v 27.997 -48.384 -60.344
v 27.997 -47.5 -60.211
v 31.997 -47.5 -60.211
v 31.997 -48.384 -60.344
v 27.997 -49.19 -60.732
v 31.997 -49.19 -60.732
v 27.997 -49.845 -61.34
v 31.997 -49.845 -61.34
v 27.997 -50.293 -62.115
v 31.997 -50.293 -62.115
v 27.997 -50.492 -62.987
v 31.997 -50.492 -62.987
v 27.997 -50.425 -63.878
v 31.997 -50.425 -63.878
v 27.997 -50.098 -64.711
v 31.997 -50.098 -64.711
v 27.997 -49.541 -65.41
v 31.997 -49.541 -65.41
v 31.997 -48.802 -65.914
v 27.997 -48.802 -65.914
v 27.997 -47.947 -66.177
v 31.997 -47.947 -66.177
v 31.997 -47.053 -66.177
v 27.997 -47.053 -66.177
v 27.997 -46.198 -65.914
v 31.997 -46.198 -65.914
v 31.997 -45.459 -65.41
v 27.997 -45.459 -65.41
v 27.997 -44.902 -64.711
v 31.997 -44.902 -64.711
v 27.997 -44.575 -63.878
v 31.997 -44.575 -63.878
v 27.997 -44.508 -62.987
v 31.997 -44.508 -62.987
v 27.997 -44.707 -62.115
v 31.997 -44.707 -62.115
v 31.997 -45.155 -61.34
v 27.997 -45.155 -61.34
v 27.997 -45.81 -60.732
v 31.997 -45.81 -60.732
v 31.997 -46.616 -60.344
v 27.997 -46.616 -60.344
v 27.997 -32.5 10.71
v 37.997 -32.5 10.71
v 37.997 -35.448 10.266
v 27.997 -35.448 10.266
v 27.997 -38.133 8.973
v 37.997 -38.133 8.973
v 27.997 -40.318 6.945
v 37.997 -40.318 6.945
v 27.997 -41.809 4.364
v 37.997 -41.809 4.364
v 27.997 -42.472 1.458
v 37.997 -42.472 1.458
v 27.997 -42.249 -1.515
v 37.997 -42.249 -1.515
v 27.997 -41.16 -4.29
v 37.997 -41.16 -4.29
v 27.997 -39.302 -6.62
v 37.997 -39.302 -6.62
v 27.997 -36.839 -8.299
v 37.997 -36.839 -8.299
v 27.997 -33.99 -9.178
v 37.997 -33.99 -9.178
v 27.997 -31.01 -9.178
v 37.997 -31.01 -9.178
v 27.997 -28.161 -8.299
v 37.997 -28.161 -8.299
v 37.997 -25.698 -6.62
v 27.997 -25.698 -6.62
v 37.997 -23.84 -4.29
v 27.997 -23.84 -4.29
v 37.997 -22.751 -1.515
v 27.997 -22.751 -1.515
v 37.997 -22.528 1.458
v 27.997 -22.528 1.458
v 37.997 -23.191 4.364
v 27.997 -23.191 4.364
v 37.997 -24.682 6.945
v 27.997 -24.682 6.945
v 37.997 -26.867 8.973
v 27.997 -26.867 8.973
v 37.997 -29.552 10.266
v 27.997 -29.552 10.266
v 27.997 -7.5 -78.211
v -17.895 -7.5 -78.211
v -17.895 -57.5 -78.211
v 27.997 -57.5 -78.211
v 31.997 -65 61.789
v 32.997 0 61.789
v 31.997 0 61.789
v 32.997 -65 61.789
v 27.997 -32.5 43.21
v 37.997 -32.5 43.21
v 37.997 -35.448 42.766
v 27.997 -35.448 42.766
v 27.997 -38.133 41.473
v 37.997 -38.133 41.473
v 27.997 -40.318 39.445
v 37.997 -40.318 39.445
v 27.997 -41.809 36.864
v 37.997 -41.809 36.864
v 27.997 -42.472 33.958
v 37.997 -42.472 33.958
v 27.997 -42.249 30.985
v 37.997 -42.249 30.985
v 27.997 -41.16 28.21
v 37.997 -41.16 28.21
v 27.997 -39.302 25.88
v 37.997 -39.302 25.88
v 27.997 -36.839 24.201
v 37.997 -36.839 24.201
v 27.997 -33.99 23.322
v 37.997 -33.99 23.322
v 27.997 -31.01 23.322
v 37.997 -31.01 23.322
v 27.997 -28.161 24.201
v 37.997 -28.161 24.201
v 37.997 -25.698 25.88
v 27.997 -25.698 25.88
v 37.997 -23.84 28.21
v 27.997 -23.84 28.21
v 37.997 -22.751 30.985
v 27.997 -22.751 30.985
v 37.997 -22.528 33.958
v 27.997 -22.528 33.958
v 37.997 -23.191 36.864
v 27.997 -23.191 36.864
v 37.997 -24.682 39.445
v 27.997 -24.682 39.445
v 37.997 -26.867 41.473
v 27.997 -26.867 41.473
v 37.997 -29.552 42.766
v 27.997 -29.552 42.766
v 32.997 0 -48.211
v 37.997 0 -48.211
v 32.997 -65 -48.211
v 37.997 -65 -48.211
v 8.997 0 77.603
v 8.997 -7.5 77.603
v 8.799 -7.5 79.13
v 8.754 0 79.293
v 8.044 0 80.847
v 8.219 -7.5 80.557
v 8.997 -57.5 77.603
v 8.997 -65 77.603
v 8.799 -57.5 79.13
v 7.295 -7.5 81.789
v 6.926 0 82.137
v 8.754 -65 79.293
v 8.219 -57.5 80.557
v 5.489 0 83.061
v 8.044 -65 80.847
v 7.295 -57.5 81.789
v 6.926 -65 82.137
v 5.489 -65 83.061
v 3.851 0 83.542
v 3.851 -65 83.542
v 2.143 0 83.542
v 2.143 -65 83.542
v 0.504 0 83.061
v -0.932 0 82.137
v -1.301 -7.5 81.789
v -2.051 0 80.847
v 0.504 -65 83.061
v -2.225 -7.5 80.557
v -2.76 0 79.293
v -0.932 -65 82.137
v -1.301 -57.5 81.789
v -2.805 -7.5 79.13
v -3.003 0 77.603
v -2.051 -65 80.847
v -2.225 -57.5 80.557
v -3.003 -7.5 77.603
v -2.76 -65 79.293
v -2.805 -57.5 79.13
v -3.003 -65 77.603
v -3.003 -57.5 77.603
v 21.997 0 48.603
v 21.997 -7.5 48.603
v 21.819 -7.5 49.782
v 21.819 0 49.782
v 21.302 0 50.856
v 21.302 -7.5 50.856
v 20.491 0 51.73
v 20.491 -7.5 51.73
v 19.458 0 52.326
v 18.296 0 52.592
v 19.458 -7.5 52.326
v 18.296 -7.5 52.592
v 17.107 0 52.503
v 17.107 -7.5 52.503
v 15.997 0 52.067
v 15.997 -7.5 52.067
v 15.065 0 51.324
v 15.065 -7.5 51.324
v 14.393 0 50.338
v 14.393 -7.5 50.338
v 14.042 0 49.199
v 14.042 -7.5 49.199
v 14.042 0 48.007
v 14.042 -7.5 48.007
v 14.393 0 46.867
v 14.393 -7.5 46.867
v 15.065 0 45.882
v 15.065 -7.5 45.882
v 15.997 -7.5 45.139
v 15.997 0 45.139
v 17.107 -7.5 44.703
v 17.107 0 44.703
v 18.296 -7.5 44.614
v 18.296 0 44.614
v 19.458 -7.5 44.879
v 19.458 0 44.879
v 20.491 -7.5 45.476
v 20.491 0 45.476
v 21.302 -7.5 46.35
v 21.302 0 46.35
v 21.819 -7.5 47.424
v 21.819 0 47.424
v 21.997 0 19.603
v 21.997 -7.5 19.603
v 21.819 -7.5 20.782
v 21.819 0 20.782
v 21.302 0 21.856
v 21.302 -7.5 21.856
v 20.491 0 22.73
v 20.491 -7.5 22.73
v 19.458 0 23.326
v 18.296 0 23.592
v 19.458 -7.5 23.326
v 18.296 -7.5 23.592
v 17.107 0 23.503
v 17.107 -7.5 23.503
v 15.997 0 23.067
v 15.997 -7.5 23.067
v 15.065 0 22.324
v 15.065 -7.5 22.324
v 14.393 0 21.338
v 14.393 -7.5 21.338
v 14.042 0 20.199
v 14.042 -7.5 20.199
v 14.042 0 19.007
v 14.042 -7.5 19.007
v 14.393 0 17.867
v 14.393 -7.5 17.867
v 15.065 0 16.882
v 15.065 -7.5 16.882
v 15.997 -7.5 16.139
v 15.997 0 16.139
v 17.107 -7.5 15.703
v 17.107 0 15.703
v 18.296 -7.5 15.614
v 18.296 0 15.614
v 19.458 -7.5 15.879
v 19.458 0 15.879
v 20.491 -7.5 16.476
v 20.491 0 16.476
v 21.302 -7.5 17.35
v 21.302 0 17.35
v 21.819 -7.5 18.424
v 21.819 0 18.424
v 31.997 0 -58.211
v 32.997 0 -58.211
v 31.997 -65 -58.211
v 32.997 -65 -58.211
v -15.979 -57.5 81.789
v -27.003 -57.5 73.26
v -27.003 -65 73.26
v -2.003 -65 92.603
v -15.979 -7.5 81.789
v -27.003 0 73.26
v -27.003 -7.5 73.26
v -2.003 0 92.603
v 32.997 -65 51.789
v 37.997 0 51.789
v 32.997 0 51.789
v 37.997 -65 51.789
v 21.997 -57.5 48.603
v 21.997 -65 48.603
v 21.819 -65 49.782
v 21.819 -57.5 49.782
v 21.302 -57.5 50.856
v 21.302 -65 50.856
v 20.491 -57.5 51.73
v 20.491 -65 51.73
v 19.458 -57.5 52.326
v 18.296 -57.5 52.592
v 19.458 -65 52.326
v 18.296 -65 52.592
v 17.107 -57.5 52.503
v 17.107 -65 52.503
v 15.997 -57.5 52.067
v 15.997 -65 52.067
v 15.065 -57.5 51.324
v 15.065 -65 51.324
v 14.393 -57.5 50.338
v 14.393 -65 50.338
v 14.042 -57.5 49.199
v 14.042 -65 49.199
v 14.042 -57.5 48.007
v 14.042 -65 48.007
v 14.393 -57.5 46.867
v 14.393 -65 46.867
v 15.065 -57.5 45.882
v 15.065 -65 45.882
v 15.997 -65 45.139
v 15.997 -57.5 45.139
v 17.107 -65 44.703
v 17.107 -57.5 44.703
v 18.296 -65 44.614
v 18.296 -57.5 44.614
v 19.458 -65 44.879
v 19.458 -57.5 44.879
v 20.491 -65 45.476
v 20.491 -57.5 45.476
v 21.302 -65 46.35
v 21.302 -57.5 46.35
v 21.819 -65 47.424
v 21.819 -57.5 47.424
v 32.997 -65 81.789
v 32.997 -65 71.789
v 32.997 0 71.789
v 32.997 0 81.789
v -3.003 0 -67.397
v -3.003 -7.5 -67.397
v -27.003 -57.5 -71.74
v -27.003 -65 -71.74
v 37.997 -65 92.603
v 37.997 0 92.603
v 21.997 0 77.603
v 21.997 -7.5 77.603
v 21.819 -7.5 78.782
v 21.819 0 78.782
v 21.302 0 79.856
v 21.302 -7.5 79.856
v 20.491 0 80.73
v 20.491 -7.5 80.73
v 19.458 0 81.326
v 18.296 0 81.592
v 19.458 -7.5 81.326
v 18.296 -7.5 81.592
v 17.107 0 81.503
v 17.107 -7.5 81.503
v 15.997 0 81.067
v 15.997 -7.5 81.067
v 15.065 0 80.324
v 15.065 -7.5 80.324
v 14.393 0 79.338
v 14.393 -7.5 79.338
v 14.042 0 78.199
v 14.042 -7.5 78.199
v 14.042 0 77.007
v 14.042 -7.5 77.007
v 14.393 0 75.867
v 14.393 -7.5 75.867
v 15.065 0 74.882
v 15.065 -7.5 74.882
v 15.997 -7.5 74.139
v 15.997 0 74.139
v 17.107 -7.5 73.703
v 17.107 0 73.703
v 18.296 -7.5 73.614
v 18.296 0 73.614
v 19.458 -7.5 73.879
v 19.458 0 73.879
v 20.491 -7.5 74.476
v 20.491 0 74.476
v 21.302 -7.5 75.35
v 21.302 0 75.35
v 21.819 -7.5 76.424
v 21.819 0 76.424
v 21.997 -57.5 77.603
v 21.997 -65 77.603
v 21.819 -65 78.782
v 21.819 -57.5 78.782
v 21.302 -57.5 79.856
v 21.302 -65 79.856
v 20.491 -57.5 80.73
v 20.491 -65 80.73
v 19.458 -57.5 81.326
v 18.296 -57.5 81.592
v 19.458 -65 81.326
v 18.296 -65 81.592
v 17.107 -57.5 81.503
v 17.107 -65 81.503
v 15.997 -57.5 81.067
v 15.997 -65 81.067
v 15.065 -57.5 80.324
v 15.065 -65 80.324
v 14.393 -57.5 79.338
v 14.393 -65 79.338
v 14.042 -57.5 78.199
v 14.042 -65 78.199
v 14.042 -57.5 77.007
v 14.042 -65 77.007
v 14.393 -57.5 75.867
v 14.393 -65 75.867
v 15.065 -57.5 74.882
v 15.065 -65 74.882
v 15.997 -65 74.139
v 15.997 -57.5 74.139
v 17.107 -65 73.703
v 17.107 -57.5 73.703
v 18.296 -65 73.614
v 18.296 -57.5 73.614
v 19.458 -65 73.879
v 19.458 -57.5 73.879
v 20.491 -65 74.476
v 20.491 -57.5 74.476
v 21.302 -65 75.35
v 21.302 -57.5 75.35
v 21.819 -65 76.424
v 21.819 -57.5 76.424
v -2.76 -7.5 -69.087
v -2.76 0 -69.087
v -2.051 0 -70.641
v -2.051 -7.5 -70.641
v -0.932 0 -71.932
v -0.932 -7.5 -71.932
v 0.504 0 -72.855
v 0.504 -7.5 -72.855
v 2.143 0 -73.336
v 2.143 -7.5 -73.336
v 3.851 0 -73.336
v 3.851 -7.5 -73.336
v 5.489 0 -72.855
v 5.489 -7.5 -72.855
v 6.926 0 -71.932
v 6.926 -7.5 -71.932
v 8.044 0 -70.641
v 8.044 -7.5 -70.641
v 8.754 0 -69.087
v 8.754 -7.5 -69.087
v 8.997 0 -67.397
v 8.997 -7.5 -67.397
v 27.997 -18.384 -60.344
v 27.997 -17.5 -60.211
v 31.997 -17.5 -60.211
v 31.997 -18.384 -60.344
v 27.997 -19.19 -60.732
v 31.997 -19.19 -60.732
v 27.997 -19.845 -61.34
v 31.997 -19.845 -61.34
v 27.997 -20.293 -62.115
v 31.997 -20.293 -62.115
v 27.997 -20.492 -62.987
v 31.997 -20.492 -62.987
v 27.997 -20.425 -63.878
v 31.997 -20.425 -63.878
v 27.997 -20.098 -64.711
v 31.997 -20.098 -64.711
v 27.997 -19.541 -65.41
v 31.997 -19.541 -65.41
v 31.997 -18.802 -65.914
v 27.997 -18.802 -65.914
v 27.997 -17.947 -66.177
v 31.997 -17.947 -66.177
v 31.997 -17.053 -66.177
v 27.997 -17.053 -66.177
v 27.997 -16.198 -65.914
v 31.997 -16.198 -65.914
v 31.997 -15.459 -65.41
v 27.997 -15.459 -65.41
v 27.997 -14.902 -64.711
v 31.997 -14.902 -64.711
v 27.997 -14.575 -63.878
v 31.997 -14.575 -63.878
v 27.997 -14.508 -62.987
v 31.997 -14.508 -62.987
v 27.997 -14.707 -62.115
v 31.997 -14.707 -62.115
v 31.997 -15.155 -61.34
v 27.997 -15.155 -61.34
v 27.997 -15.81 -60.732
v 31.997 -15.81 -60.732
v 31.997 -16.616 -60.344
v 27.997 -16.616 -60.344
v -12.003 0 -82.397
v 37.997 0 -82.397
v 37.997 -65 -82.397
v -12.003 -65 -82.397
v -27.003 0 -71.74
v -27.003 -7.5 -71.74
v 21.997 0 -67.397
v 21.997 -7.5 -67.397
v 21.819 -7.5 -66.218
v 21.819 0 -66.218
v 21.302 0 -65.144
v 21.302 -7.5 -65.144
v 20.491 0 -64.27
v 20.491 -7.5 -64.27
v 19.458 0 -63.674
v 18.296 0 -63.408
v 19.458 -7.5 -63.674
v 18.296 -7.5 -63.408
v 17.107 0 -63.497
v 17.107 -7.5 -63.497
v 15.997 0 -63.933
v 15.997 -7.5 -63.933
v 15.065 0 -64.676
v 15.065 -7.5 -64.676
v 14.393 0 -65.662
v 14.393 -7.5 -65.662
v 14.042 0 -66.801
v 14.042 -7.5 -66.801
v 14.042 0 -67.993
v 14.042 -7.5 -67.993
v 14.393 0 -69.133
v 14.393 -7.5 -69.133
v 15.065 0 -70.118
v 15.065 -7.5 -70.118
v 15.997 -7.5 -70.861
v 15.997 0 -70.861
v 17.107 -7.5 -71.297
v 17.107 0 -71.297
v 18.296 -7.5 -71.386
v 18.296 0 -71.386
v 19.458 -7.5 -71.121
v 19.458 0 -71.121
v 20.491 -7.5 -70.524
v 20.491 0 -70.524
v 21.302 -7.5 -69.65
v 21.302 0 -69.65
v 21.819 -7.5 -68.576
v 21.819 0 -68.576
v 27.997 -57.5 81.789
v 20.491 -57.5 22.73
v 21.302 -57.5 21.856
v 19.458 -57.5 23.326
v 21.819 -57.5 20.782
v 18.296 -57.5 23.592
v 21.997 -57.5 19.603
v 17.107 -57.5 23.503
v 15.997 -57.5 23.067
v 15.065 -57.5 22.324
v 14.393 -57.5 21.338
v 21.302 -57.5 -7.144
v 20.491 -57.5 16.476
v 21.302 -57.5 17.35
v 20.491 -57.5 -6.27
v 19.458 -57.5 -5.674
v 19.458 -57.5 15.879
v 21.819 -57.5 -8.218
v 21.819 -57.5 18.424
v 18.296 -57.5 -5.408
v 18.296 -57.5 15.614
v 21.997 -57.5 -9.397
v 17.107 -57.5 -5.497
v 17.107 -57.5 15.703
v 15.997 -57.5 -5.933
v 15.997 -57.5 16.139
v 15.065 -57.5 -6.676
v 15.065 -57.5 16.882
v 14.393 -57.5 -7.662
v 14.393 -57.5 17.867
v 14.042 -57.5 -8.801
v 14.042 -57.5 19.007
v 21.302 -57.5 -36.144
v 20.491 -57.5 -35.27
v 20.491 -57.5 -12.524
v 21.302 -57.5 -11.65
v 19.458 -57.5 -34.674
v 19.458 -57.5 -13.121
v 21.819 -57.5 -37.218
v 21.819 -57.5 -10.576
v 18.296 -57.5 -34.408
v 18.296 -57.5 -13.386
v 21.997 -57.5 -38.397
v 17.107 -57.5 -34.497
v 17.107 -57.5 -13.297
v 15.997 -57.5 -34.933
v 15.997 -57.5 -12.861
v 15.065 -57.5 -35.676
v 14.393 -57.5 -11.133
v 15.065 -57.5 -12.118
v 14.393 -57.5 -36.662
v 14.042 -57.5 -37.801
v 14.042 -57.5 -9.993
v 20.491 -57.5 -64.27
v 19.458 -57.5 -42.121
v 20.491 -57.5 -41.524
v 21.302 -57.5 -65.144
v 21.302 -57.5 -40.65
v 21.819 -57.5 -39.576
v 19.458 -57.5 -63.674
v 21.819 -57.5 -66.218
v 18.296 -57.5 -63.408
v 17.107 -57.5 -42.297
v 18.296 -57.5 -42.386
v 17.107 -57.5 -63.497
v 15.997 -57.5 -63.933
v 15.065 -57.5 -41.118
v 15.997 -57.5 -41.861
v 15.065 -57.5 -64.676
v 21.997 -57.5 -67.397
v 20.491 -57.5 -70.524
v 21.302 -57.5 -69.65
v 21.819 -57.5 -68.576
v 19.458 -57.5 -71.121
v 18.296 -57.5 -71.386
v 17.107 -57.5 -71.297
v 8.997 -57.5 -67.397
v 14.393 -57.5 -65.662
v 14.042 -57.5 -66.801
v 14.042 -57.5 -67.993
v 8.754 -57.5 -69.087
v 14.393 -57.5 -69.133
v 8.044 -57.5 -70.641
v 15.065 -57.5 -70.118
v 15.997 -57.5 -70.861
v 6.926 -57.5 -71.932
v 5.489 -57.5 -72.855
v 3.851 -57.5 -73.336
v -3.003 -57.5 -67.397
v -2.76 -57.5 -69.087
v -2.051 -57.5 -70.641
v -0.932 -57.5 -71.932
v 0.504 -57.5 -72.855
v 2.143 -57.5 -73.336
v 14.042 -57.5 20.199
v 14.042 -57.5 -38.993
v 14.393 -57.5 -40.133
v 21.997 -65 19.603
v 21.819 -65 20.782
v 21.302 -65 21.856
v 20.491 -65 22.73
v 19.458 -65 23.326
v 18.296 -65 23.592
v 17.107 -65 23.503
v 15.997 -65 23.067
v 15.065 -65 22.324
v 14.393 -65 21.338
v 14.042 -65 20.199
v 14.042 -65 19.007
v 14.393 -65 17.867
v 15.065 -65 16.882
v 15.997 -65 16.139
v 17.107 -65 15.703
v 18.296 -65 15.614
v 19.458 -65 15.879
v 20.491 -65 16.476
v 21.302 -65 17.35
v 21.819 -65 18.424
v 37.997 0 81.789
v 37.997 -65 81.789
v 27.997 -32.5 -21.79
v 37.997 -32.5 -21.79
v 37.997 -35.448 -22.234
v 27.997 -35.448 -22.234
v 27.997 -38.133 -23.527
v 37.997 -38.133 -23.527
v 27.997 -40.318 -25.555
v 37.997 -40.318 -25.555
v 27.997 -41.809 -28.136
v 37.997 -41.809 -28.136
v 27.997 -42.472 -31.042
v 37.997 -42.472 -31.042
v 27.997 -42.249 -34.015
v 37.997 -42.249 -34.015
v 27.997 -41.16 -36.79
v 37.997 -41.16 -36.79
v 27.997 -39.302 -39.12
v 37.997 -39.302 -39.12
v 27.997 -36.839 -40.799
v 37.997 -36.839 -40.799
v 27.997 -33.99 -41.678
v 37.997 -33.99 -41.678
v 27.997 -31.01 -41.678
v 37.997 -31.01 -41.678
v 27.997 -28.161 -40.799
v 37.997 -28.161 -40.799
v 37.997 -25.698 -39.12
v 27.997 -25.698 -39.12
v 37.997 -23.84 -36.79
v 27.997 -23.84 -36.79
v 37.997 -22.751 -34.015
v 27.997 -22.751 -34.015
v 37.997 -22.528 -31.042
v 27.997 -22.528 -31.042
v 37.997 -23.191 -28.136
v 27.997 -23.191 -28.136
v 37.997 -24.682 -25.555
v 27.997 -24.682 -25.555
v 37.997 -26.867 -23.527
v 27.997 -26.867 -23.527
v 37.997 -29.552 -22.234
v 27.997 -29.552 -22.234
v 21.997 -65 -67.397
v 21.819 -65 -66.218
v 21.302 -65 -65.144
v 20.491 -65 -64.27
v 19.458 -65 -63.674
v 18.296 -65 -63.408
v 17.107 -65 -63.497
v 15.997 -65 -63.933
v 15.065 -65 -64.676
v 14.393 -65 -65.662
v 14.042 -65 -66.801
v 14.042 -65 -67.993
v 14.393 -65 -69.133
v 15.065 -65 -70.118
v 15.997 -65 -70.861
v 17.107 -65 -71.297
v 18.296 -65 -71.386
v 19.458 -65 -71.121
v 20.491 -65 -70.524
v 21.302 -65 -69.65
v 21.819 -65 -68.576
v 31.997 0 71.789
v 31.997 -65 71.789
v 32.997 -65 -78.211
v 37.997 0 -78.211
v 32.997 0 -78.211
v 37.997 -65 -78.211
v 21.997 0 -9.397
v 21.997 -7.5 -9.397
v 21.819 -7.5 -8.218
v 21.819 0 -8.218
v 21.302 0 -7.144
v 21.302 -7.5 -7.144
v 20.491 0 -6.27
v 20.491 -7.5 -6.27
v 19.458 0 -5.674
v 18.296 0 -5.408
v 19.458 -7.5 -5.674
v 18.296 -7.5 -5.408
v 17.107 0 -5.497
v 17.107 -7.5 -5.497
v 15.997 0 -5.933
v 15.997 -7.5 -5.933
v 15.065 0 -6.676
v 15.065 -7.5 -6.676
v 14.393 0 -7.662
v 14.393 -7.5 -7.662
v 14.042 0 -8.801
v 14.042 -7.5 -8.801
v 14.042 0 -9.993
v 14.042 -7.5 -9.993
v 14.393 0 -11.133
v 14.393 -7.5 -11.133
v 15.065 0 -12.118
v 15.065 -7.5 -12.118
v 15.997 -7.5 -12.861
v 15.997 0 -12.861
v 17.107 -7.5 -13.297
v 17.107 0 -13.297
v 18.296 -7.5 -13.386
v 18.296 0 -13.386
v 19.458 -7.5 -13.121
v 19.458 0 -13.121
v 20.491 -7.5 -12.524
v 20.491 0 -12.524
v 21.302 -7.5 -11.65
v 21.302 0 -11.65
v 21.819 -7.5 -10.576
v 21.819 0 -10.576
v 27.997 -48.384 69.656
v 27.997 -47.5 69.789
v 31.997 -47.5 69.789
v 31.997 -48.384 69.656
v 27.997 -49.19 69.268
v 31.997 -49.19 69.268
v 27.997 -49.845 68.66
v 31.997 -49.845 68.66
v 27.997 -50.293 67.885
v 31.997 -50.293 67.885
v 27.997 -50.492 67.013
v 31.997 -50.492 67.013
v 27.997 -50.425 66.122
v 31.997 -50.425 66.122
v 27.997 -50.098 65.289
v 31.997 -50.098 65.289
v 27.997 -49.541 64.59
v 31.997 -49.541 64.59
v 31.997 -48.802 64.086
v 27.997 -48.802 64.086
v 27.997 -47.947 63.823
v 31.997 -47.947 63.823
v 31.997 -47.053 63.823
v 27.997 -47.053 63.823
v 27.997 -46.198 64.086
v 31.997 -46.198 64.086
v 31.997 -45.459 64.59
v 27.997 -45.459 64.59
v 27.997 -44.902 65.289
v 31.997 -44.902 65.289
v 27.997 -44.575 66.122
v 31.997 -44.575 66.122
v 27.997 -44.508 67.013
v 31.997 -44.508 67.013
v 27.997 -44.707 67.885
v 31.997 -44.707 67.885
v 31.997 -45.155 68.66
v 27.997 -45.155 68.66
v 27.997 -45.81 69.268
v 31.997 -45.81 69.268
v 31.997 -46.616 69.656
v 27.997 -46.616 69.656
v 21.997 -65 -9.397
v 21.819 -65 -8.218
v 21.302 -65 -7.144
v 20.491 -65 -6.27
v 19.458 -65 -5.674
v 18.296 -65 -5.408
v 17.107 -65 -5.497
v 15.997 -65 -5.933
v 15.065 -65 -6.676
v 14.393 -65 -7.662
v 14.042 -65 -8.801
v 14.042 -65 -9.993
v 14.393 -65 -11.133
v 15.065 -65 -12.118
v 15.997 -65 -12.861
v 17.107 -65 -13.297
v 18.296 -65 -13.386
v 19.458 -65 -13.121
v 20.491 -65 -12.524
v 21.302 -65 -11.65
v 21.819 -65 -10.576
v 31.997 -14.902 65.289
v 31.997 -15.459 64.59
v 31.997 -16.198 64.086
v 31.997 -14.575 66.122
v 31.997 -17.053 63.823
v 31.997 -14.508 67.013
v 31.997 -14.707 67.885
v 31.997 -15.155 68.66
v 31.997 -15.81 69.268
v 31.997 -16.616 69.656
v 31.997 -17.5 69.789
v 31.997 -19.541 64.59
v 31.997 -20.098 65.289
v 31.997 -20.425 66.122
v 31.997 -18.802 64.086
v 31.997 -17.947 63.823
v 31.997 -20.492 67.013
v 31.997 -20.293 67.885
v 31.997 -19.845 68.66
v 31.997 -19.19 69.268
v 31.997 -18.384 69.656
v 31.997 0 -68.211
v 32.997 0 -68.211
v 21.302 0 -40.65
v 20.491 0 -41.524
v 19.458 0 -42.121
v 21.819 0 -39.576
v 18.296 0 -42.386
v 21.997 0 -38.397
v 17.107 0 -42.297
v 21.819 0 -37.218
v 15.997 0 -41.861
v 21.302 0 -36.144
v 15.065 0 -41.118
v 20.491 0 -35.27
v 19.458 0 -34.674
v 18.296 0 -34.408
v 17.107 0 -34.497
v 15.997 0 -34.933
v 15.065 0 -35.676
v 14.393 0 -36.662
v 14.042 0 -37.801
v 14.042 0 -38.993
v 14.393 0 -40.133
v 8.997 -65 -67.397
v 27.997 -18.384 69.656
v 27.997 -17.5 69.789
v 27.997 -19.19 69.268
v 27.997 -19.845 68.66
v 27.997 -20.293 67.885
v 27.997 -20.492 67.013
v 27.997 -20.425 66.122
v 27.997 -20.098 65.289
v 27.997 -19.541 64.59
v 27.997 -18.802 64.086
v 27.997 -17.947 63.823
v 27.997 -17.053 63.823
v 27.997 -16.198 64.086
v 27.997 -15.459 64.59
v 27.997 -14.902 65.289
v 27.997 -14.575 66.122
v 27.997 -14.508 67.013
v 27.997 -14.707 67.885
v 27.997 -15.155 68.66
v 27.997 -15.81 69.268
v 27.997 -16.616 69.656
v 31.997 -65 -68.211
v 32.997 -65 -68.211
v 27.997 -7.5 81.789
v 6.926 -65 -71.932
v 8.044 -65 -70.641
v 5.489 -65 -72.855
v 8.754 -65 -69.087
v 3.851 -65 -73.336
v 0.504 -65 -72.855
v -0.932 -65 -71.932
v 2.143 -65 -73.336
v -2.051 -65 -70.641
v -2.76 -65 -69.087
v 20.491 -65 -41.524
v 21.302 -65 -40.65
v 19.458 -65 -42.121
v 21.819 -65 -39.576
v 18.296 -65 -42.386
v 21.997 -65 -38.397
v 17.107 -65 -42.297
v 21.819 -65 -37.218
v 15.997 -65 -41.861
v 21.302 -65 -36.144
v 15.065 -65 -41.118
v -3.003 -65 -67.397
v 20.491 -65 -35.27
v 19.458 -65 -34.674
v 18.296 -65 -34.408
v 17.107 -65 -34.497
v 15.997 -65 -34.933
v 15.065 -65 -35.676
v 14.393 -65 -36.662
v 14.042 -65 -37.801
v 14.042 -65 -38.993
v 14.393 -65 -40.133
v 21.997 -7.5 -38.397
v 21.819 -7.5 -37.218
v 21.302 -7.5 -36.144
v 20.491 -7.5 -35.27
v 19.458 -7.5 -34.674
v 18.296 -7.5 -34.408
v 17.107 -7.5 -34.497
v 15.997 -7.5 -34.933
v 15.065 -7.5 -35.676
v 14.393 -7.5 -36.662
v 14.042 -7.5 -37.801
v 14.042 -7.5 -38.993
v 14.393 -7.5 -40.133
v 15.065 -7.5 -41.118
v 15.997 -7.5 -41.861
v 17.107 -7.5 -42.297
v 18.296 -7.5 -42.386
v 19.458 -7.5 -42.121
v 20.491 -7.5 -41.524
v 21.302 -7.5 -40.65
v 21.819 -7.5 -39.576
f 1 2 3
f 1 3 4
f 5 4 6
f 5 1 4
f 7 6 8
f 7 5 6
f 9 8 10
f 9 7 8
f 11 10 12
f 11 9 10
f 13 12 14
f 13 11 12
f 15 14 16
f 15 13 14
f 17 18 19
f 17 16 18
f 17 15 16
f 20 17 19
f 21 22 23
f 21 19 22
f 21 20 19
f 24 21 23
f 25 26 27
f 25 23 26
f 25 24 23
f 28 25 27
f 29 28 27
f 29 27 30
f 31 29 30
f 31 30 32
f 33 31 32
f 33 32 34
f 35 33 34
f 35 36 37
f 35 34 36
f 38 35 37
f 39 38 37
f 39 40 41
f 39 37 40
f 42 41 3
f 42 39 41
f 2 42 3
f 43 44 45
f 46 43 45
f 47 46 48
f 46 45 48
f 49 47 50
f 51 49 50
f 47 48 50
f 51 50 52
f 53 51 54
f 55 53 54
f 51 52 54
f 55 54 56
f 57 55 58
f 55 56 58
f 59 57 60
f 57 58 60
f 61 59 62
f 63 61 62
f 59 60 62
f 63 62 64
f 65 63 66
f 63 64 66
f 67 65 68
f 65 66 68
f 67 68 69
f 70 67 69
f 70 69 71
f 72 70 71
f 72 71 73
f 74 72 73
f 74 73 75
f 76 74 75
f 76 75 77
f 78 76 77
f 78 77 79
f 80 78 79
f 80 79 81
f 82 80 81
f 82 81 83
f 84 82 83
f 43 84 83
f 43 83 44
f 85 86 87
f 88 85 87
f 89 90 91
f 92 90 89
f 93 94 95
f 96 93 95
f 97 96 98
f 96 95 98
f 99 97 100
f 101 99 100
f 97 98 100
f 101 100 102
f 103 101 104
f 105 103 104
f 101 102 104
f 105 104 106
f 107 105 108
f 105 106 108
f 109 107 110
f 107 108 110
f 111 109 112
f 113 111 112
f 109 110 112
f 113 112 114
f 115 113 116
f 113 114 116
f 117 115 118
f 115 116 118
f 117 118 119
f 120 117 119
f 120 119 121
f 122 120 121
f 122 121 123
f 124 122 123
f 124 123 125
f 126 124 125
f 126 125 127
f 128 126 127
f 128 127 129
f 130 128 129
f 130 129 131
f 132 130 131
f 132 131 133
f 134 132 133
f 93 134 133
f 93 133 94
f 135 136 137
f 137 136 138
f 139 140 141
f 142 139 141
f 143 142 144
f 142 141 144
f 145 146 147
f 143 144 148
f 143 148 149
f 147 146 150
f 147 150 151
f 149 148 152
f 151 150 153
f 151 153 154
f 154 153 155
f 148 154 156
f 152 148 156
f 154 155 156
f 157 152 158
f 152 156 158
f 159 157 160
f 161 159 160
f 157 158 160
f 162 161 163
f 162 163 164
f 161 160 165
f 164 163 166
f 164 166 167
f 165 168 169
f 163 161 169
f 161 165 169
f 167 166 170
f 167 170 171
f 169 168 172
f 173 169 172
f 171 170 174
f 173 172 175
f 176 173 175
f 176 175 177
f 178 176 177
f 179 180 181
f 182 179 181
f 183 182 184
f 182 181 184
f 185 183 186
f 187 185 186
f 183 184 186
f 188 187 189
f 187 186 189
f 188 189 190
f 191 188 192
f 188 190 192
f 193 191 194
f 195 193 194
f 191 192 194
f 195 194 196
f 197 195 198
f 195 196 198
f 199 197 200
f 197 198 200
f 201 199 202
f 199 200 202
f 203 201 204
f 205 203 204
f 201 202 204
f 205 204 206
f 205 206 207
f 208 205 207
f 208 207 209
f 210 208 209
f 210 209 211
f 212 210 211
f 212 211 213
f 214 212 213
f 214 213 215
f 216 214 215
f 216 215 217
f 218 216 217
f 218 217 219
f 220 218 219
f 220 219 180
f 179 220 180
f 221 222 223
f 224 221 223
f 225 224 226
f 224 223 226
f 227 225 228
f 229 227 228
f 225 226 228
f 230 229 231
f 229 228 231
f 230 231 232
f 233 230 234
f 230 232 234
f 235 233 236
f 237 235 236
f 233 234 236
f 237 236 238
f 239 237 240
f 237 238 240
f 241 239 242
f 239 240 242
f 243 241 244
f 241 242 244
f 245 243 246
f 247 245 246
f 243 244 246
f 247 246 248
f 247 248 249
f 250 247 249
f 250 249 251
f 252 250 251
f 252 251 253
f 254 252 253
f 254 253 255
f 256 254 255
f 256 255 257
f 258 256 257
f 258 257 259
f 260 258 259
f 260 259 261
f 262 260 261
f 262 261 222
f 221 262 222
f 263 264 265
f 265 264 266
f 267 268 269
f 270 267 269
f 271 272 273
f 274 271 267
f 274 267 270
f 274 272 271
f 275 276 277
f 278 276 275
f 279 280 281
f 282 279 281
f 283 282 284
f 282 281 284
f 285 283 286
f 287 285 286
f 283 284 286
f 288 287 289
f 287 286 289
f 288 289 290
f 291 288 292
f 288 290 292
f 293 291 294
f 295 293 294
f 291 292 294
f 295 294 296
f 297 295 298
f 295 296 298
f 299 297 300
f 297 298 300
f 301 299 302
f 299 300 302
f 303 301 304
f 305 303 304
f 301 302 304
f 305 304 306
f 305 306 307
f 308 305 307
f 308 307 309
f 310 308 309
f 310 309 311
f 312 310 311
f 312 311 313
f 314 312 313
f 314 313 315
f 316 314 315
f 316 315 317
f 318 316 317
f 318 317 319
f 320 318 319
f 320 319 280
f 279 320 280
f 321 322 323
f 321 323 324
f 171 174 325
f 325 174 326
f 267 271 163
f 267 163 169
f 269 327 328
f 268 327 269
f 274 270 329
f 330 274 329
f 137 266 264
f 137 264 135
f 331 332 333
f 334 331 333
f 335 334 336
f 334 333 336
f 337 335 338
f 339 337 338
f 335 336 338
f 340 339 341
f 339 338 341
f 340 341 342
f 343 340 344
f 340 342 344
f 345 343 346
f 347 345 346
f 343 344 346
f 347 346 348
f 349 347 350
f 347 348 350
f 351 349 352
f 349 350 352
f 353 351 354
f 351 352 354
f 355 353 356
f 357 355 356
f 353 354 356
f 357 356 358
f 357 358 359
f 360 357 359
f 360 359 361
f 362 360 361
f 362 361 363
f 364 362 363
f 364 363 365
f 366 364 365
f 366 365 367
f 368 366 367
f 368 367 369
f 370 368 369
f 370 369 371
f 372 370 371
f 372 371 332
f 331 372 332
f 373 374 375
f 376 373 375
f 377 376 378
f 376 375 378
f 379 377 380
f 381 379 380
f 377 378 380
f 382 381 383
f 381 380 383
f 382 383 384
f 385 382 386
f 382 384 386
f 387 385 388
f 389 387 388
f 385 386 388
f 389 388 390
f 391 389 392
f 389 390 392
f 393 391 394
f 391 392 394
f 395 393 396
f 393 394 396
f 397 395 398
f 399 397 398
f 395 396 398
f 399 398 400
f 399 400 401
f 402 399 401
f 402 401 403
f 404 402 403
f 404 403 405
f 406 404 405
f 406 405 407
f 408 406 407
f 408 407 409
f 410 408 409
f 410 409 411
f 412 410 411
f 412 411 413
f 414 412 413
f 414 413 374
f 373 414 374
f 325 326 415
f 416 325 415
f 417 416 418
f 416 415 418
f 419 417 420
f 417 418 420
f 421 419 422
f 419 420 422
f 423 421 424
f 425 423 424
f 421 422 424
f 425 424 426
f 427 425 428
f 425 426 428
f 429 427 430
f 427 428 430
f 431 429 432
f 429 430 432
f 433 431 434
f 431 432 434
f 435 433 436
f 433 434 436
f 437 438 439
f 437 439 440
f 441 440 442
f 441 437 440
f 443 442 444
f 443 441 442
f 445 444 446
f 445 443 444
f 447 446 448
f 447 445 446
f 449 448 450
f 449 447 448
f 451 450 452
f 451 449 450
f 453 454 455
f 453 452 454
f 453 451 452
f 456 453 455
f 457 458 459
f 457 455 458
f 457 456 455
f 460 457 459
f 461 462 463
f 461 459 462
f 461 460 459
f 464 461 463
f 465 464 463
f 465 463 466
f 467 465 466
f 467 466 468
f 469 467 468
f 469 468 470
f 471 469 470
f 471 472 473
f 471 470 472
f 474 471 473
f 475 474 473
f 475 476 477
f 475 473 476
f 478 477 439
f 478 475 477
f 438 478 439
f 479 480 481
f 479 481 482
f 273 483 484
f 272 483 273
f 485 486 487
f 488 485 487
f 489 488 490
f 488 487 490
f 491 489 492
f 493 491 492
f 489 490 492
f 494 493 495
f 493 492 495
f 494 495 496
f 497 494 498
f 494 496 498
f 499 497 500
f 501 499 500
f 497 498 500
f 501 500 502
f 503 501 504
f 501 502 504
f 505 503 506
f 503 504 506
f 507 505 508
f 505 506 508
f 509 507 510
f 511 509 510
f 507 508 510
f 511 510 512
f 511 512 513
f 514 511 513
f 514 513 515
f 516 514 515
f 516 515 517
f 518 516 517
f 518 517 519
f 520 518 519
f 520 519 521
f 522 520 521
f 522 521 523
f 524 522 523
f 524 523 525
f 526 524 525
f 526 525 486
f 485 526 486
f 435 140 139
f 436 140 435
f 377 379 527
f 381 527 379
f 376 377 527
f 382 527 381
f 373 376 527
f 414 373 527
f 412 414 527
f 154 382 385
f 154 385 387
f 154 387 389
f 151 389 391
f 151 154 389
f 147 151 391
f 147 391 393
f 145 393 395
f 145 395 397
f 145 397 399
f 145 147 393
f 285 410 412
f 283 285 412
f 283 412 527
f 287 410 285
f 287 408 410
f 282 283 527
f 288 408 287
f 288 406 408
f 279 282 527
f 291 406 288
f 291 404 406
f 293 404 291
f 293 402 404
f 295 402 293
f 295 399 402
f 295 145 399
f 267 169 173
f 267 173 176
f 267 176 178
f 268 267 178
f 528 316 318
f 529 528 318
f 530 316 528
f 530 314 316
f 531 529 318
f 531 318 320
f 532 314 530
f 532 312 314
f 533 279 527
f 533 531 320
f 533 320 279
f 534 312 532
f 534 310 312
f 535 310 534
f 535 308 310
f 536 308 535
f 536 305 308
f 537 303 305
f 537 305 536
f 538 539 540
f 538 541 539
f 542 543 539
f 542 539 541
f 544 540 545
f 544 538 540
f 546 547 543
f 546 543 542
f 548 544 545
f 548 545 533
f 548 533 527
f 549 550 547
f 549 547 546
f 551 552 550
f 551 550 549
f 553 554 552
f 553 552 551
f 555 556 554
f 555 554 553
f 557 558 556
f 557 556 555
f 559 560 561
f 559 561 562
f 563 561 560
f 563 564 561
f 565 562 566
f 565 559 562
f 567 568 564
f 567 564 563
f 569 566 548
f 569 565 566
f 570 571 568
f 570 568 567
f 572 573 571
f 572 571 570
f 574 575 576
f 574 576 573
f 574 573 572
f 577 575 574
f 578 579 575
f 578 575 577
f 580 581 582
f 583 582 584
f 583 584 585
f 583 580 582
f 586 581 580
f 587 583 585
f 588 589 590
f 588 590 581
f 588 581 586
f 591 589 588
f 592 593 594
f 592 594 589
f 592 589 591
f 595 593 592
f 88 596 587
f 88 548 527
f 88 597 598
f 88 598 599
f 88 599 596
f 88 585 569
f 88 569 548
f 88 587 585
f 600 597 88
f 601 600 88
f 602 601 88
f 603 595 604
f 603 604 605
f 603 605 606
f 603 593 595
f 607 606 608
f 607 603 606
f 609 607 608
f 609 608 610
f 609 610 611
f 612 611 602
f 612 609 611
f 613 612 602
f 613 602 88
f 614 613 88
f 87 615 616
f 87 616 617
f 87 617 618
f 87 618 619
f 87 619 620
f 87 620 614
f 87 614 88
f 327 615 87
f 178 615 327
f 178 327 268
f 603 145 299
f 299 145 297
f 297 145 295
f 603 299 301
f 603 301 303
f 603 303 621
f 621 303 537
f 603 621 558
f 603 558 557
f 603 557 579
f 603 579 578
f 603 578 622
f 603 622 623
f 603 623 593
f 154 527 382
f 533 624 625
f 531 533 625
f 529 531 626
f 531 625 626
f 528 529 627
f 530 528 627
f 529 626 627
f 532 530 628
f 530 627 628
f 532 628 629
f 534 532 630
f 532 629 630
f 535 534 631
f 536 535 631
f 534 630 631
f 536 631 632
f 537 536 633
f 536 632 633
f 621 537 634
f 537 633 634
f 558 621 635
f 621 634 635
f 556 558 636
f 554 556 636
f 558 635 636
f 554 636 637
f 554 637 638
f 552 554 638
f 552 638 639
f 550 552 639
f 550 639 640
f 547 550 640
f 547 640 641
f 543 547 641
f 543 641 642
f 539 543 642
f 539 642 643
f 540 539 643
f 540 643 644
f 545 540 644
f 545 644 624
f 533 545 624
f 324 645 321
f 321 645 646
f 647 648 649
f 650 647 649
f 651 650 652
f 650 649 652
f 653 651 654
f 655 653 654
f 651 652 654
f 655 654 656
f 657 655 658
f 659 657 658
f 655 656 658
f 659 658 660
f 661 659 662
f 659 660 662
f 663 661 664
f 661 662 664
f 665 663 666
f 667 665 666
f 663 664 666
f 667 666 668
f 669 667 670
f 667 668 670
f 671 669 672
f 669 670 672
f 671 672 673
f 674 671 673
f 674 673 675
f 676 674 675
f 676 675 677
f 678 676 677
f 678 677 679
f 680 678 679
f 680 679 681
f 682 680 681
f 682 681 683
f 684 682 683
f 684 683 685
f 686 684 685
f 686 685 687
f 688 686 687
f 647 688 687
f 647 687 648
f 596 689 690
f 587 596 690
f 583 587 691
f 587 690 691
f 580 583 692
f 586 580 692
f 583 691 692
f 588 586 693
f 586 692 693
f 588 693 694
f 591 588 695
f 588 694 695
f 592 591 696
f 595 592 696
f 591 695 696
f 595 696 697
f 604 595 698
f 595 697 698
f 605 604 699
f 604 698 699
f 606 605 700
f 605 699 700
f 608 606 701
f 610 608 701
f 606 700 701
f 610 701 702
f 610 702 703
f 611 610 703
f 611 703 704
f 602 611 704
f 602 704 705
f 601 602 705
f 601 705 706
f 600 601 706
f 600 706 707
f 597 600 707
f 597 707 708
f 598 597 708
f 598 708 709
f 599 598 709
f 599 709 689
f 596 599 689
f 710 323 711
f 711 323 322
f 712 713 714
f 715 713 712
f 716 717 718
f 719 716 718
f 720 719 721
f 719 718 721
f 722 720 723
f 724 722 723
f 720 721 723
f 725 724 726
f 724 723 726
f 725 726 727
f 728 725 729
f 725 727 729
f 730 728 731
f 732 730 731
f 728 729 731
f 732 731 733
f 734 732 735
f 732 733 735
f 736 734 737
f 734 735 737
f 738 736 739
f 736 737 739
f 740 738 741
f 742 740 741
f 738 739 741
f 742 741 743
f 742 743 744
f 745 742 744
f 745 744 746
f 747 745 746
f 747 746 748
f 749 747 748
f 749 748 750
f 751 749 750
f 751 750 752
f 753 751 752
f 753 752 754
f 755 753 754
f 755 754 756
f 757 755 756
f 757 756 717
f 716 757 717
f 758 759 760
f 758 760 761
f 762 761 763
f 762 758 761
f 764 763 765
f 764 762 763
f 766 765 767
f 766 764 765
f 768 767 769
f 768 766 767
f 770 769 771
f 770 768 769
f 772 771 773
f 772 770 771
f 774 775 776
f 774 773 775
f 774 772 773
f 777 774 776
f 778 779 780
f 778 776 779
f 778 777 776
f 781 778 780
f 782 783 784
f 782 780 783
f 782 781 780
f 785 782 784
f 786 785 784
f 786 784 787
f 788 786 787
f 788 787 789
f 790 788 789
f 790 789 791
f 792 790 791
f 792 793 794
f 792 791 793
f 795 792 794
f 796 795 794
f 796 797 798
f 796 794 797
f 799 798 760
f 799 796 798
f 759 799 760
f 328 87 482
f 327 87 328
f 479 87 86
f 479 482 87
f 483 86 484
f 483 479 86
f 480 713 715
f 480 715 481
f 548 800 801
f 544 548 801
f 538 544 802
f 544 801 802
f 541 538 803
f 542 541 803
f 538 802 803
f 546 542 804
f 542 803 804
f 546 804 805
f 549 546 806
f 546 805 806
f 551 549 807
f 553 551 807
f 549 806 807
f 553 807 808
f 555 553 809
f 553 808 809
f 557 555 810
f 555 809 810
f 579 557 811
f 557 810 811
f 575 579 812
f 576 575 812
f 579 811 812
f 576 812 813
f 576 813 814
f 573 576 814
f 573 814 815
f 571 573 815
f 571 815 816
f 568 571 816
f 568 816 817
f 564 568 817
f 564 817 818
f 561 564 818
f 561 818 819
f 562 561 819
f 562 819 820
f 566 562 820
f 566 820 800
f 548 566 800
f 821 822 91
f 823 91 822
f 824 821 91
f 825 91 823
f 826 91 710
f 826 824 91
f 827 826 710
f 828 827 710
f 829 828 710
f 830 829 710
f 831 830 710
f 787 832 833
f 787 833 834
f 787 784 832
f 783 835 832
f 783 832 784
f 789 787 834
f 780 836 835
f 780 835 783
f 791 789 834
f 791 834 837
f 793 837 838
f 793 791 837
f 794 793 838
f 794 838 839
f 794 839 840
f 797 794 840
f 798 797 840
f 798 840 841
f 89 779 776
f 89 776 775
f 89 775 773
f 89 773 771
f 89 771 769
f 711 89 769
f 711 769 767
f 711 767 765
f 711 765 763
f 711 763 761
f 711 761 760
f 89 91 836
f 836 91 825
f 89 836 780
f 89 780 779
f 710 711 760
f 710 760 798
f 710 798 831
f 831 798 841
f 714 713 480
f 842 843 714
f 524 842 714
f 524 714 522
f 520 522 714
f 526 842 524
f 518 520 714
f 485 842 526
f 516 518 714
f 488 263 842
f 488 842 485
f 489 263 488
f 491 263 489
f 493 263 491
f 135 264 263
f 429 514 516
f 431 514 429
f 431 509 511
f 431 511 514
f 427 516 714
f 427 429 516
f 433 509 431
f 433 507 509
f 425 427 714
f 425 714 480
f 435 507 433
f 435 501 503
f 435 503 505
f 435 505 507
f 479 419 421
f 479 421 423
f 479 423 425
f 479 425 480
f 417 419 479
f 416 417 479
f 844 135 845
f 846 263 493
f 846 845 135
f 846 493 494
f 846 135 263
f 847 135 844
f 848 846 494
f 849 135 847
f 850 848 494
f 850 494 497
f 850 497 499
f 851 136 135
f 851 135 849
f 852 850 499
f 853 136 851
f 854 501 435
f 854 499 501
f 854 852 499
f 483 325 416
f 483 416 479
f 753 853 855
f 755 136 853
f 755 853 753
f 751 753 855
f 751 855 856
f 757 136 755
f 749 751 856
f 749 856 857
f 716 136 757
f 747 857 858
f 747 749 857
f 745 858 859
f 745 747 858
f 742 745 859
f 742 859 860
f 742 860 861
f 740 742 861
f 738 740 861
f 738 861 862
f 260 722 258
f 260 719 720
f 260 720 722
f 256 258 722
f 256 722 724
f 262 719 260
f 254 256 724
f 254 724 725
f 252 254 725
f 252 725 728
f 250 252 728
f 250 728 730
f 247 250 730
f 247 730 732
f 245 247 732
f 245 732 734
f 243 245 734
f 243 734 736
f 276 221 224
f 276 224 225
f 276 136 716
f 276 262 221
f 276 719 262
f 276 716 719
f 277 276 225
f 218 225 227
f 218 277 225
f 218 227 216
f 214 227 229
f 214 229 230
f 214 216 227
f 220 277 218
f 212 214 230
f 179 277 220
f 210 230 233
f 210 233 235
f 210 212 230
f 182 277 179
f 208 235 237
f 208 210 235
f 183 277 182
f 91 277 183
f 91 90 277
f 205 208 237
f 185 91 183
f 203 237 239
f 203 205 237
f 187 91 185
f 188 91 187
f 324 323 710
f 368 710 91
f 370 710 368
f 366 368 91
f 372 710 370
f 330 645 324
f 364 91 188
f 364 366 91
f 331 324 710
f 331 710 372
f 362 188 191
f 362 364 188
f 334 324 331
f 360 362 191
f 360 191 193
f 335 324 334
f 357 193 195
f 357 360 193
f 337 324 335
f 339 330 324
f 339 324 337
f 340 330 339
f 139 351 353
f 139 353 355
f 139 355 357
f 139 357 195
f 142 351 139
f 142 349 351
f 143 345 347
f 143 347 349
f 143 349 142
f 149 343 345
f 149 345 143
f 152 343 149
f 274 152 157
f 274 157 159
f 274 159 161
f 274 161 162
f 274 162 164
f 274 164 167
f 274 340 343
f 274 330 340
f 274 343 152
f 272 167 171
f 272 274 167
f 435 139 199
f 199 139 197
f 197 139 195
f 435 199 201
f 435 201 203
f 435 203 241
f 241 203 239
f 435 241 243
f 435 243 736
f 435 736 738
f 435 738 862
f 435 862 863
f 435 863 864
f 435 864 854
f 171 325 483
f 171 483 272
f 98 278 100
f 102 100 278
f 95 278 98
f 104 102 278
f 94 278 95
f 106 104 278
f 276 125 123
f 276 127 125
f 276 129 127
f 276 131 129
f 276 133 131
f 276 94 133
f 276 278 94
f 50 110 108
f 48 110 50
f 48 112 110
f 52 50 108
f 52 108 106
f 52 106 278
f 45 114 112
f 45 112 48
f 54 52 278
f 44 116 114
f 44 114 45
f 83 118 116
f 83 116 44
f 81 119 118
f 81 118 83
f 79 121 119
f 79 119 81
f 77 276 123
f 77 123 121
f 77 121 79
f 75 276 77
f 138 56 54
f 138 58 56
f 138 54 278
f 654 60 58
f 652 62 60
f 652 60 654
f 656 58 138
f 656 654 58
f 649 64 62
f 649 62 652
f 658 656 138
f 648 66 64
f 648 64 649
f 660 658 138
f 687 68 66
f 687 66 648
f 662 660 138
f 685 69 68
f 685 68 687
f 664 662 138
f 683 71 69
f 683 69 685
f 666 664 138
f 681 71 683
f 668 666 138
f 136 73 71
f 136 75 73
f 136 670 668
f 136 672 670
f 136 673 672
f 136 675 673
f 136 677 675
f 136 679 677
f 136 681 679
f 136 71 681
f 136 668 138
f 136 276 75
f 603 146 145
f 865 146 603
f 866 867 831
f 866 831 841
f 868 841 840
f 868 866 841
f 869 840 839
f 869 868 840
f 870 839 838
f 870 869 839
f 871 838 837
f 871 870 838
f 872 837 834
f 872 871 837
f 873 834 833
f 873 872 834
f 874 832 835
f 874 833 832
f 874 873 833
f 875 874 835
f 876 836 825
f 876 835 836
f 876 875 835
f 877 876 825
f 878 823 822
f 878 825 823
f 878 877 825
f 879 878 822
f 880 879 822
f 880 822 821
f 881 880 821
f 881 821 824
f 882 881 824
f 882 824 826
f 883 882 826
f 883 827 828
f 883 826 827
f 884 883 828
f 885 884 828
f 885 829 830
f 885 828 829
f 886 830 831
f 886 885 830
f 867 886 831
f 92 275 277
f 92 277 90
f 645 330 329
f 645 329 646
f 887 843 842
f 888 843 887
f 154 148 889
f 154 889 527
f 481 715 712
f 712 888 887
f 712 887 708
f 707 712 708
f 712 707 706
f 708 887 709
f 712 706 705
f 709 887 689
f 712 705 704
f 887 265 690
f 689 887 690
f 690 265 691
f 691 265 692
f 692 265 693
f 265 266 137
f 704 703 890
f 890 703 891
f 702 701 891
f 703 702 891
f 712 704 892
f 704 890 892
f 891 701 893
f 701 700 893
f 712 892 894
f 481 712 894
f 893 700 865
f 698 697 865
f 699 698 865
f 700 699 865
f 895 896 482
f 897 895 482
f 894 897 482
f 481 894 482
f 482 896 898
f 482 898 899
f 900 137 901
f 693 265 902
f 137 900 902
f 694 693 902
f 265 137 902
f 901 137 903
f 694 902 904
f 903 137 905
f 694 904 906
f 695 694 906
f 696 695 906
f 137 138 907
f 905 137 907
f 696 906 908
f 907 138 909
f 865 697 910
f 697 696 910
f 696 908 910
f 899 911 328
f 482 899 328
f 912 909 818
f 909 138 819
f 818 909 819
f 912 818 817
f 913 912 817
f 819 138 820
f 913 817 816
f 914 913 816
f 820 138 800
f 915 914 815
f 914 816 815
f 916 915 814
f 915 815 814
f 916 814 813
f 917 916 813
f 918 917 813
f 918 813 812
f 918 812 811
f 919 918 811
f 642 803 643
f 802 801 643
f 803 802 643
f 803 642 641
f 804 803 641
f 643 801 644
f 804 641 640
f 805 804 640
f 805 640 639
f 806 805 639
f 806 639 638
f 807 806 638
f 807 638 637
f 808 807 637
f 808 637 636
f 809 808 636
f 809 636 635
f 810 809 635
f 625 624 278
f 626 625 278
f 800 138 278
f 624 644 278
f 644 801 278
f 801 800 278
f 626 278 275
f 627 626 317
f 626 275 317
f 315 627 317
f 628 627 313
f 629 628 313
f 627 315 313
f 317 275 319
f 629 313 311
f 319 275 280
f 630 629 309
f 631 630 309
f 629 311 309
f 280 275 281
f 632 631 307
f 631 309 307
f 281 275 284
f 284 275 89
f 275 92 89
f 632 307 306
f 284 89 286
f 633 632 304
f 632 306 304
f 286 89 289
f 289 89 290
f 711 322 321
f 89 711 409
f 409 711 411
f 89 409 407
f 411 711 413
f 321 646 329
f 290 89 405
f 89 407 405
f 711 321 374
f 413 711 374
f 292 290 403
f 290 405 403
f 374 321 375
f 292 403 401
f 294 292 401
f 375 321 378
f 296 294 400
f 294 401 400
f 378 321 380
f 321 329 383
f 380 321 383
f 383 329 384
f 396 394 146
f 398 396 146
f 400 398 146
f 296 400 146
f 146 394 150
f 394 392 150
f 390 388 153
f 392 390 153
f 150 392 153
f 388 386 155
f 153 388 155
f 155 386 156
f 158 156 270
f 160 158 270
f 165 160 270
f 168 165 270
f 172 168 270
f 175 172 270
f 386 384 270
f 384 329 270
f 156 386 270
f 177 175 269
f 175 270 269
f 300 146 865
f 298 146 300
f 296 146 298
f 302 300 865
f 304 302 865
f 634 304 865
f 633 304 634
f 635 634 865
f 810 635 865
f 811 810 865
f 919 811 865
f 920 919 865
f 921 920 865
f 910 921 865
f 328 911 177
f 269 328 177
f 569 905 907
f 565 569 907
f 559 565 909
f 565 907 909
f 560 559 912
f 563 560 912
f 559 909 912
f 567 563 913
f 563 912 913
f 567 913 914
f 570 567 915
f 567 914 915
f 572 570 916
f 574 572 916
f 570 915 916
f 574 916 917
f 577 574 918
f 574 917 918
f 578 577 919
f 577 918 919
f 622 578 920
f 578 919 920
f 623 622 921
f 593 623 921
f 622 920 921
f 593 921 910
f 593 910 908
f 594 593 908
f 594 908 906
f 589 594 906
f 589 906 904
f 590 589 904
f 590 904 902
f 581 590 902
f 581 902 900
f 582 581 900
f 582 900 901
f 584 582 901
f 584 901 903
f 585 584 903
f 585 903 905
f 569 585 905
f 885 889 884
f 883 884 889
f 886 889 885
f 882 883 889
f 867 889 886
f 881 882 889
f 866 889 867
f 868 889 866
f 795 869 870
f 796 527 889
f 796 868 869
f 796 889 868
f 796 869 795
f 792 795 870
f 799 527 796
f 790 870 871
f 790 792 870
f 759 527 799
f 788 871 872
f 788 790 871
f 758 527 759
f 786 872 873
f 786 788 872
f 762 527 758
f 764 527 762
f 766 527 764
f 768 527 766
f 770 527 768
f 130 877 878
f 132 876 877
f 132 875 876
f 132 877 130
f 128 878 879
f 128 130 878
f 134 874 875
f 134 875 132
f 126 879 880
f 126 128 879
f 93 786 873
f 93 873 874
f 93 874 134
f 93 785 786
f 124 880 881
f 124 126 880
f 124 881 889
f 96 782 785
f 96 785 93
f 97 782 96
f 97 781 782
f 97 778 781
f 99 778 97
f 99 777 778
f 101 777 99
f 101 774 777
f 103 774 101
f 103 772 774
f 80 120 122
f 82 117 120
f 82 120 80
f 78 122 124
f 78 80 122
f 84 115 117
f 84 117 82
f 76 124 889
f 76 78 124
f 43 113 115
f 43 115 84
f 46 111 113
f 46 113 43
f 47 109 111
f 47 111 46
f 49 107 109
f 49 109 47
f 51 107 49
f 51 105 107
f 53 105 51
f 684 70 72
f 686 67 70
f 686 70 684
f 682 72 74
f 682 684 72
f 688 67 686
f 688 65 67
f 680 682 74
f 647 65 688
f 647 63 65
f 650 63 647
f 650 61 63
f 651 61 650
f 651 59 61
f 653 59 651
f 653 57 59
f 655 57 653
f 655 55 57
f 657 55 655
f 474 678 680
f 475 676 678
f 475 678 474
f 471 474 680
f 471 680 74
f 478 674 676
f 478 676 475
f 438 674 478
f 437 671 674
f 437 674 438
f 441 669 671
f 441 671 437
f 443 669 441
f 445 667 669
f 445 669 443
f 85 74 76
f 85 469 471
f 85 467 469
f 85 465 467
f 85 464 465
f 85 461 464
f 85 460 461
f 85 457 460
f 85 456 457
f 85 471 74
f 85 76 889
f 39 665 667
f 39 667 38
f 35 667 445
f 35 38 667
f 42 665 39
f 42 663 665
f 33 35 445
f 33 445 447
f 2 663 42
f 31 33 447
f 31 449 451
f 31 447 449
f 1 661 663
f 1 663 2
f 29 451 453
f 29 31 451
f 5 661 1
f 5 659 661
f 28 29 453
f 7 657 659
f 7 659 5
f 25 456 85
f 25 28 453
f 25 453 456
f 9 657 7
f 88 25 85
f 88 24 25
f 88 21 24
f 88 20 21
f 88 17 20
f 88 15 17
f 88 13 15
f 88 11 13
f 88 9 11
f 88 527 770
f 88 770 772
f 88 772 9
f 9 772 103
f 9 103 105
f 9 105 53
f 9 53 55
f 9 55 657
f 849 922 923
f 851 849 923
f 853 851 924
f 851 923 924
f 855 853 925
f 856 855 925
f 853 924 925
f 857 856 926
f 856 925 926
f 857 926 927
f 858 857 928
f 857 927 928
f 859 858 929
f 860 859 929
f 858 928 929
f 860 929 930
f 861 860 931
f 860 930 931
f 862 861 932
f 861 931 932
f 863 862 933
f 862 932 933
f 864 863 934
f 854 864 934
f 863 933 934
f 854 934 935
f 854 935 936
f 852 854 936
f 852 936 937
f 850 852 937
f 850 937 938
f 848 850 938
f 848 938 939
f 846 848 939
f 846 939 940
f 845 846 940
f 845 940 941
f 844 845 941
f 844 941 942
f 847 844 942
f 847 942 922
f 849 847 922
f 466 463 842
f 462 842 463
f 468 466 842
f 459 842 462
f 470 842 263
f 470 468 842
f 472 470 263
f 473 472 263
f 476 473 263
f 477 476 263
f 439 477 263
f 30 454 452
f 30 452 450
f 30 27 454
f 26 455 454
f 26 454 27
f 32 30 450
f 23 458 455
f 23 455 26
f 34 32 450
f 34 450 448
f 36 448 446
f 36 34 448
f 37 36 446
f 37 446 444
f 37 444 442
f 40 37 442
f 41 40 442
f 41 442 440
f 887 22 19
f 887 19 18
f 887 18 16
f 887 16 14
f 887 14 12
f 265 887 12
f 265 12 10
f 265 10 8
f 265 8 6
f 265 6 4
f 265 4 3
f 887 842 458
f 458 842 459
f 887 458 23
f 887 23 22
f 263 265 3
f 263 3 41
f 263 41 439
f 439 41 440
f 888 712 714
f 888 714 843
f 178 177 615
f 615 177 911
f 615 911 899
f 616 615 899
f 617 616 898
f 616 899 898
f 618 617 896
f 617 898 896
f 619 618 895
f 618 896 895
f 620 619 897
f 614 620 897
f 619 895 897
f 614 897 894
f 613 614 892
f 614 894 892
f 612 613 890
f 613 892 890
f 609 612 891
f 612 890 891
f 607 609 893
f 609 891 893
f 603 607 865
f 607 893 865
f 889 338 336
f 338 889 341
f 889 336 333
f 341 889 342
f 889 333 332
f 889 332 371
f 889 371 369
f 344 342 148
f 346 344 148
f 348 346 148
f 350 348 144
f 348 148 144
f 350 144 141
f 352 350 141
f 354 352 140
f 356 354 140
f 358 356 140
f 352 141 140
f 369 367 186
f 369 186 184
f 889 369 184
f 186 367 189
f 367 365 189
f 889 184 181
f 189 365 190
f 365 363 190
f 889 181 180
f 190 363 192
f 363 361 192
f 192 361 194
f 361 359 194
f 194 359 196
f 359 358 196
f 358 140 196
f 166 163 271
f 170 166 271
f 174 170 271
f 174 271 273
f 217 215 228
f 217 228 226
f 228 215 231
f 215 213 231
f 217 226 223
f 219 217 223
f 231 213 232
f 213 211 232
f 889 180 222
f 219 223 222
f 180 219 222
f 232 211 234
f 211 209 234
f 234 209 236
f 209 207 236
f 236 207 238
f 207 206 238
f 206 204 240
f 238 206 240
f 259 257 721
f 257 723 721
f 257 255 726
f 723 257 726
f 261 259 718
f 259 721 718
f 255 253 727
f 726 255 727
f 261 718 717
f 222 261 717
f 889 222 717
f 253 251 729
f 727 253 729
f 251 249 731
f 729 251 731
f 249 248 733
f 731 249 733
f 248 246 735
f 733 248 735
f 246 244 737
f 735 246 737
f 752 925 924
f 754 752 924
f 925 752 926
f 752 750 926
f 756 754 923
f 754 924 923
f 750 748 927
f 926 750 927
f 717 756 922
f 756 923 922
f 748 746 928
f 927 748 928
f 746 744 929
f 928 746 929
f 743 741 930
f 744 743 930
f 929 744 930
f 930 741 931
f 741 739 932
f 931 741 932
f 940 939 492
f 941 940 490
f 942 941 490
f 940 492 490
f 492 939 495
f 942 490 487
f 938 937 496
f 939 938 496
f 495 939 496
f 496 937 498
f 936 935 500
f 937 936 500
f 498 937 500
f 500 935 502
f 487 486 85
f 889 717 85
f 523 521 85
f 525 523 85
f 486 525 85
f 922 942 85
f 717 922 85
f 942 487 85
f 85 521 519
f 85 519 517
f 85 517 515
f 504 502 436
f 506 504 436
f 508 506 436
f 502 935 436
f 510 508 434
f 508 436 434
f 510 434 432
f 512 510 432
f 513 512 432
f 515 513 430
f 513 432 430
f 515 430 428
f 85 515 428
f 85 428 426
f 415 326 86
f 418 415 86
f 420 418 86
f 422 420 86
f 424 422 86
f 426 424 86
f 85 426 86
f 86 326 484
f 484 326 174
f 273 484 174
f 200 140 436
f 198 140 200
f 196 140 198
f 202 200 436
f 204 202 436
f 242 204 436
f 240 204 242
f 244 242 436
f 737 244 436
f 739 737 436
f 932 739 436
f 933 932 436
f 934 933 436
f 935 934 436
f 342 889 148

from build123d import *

# Parameters (mm, degrees)
PAD_DEPTH              = 65
POCKET_DEPTH           = 65.001
SKETCH002_R            = 4
POCKET001_DEPTH        = 65.001
LINEARPATTERN_COUNT    = 6
LINEARPATTERN_PITCH    = 29
SKETCH003_W            = 160
SKETCH003_H            = 50
POCKET002_DEPTH        = 55
SKETCH004_W            = 30
SKETCH004_H            = 65
POCKET003_DEPTH        = 5
SKETCH005_R            = 3
POCKET004_DEPTH        = 12.172573
SKETCH035_R            = 10
POCKET023_DEPTH        = 65.001
LINEARPATTERN001_COUNT = 3
LINEARPATTERN001_PITCH = 32.5
SKETCH076_W            = 10
SKETCH076_H            = 65
POCKET047_DEPTH        = 1


with BuildPart() as part:
    # Sketch → Pad (new body)
    with BuildSketch(Plane.XZ):
        Polygon((-2.003095, 92.602939), (37.996905, 92.602939), (37.996905, -82.397061), (-12.003095, -82.397061), (-27.003095, -71.740207), (-27.003095, 73.259793), align=None)
    extrude(amount=PAD_DEPTH)

    # Sketch001 (on Face8 of Pad) → Pocket (cut, through all)
    with BuildSketch(Plane.XZ.offset(65)):
        with BuildLine():
            ThreePointArc((8.996905, 77.602939), (2.996905, 83.602939), (-3.003095, 77.602939))
            Line((-3.003095, 77.602939), (-3.003095, -67.397061))
            ThreePointArc((-3.003095, -67.397061), (2.996905, -73.397061), (8.996905, -67.397061))
            Line((8.996905, 77.602939), (8.996905, -67.397061))
        make_face()
    extrude(amount=-POCKET_DEPTH, mode=Mode.SUBTRACT)

    # Sketch002 (on Face5 of Pocket) → Pocket001 (cut, through all)
    with BuildSketch(Plane.XZ.offset(65)):
        with Locations((17.996905, 77.602939)):
            Circle(SKETCH002_R)
    pocket001 = extrude(amount=-POCKET001_DEPTH, mode=Mode.SUBTRACT)

    # LinearPattern: Pocket001 ×6
    with Locations(*[(0, 0, -i * LINEARPATTERN_PITCH) for i in range(1, LINEARPATTERN_COUNT)]):
        add(pocket001, mode=Mode.SUBTRACT)

    # Sketch003 (on Face1 of LinearPattern) → Pocket002 (cut)
    with BuildSketch(Plane(origin=(-27.003095, 0, 0), x_dir=(0, 0, -1), z_dir=(-1, 0, 0))):
        with Locations((-1.789118, 32.5)):
            Rectangle(SKETCH003_W, SKETCH003_H)
    extrude(amount=-POCKET002_DEPTH, mode=Mode.SUBTRACT)

    # Sketch004 (on Face8 of Pocket002) → Pocket003 (cut)
    with BuildSketch(Plane(origin=(37.996905, 0, 0), x_dir=(0, 0, 1), z_dir=(1, 0, 0))):
        with Locations((-63.210882, 32.5)):
            Rectangle(SKETCH004_W, SKETCH004_H)
        with Locations((66.789118, 32.5)):
            Rectangle(SKETCH004_W, SKETCH004_H)
    extrude(amount=-POCKET003_DEPTH, mode=Mode.SUBTRACT)

    # Sketch005 → Pocket004 (cut, through all)
    with BuildSketch(Plane(origin=(25.825332, 0, 0), x_dir=(0, 0, 1), z_dir=(1, 0, 0))):
        with Locations((-63.210882, 17.5)):
            Circle(SKETCH005_R)
        with Locations((-63.210882, 47.5)):
            Circle(SKETCH005_R)
        with Locations((66.789118, 47.5)):
            Circle(SKETCH005_R)
        with Locations((66.789118, 17.5)):
            Circle(SKETCH005_R)
    extrude(amount=POCKET004_DEPTH, mode=Mode.SUBTRACT)

    # Sketch035 → Pocket023 (cut, through all)
    with BuildSketch(Plane(origin=(37.996905, 0, 0), x_dir=(0, 0, 1), z_dir=(1, 0, 0))):
        with Locations((-31.789585, 32.5)):
            Circle(SKETCH035_R)
    pocket023 = extrude(amount=-POCKET023_DEPTH, mode=Mode.SUBTRACT)

    # LinearPattern001: Pocket023 ×3
    with Locations(*[(0, 0, i * LINEARPATTERN001_PITCH) for i in range(1, LINEARPATTERN001_COUNT)]):
        add(pocket023, mode=Mode.SUBTRACT)

    # Sketch076 (on Face13 of Pocket004) → Pocket047 (cut)
    with BuildSketch(Plane(origin=(32.996905, 0, 0), x_dir=(0, 0, 1), z_dir=(1, 0, 0))):
        with Locations((-63.210882, 32.5)):
            Rectangle(SKETCH076_W, SKETCH076_H)
        with Locations((66.789118, 32.5)):
            Rectangle(SKETCH076_W, SKETCH076_H)
    extrude(amount=-POCKET047_DEPTH, mode=Mode.SUBTRACT)


solid = part.part
